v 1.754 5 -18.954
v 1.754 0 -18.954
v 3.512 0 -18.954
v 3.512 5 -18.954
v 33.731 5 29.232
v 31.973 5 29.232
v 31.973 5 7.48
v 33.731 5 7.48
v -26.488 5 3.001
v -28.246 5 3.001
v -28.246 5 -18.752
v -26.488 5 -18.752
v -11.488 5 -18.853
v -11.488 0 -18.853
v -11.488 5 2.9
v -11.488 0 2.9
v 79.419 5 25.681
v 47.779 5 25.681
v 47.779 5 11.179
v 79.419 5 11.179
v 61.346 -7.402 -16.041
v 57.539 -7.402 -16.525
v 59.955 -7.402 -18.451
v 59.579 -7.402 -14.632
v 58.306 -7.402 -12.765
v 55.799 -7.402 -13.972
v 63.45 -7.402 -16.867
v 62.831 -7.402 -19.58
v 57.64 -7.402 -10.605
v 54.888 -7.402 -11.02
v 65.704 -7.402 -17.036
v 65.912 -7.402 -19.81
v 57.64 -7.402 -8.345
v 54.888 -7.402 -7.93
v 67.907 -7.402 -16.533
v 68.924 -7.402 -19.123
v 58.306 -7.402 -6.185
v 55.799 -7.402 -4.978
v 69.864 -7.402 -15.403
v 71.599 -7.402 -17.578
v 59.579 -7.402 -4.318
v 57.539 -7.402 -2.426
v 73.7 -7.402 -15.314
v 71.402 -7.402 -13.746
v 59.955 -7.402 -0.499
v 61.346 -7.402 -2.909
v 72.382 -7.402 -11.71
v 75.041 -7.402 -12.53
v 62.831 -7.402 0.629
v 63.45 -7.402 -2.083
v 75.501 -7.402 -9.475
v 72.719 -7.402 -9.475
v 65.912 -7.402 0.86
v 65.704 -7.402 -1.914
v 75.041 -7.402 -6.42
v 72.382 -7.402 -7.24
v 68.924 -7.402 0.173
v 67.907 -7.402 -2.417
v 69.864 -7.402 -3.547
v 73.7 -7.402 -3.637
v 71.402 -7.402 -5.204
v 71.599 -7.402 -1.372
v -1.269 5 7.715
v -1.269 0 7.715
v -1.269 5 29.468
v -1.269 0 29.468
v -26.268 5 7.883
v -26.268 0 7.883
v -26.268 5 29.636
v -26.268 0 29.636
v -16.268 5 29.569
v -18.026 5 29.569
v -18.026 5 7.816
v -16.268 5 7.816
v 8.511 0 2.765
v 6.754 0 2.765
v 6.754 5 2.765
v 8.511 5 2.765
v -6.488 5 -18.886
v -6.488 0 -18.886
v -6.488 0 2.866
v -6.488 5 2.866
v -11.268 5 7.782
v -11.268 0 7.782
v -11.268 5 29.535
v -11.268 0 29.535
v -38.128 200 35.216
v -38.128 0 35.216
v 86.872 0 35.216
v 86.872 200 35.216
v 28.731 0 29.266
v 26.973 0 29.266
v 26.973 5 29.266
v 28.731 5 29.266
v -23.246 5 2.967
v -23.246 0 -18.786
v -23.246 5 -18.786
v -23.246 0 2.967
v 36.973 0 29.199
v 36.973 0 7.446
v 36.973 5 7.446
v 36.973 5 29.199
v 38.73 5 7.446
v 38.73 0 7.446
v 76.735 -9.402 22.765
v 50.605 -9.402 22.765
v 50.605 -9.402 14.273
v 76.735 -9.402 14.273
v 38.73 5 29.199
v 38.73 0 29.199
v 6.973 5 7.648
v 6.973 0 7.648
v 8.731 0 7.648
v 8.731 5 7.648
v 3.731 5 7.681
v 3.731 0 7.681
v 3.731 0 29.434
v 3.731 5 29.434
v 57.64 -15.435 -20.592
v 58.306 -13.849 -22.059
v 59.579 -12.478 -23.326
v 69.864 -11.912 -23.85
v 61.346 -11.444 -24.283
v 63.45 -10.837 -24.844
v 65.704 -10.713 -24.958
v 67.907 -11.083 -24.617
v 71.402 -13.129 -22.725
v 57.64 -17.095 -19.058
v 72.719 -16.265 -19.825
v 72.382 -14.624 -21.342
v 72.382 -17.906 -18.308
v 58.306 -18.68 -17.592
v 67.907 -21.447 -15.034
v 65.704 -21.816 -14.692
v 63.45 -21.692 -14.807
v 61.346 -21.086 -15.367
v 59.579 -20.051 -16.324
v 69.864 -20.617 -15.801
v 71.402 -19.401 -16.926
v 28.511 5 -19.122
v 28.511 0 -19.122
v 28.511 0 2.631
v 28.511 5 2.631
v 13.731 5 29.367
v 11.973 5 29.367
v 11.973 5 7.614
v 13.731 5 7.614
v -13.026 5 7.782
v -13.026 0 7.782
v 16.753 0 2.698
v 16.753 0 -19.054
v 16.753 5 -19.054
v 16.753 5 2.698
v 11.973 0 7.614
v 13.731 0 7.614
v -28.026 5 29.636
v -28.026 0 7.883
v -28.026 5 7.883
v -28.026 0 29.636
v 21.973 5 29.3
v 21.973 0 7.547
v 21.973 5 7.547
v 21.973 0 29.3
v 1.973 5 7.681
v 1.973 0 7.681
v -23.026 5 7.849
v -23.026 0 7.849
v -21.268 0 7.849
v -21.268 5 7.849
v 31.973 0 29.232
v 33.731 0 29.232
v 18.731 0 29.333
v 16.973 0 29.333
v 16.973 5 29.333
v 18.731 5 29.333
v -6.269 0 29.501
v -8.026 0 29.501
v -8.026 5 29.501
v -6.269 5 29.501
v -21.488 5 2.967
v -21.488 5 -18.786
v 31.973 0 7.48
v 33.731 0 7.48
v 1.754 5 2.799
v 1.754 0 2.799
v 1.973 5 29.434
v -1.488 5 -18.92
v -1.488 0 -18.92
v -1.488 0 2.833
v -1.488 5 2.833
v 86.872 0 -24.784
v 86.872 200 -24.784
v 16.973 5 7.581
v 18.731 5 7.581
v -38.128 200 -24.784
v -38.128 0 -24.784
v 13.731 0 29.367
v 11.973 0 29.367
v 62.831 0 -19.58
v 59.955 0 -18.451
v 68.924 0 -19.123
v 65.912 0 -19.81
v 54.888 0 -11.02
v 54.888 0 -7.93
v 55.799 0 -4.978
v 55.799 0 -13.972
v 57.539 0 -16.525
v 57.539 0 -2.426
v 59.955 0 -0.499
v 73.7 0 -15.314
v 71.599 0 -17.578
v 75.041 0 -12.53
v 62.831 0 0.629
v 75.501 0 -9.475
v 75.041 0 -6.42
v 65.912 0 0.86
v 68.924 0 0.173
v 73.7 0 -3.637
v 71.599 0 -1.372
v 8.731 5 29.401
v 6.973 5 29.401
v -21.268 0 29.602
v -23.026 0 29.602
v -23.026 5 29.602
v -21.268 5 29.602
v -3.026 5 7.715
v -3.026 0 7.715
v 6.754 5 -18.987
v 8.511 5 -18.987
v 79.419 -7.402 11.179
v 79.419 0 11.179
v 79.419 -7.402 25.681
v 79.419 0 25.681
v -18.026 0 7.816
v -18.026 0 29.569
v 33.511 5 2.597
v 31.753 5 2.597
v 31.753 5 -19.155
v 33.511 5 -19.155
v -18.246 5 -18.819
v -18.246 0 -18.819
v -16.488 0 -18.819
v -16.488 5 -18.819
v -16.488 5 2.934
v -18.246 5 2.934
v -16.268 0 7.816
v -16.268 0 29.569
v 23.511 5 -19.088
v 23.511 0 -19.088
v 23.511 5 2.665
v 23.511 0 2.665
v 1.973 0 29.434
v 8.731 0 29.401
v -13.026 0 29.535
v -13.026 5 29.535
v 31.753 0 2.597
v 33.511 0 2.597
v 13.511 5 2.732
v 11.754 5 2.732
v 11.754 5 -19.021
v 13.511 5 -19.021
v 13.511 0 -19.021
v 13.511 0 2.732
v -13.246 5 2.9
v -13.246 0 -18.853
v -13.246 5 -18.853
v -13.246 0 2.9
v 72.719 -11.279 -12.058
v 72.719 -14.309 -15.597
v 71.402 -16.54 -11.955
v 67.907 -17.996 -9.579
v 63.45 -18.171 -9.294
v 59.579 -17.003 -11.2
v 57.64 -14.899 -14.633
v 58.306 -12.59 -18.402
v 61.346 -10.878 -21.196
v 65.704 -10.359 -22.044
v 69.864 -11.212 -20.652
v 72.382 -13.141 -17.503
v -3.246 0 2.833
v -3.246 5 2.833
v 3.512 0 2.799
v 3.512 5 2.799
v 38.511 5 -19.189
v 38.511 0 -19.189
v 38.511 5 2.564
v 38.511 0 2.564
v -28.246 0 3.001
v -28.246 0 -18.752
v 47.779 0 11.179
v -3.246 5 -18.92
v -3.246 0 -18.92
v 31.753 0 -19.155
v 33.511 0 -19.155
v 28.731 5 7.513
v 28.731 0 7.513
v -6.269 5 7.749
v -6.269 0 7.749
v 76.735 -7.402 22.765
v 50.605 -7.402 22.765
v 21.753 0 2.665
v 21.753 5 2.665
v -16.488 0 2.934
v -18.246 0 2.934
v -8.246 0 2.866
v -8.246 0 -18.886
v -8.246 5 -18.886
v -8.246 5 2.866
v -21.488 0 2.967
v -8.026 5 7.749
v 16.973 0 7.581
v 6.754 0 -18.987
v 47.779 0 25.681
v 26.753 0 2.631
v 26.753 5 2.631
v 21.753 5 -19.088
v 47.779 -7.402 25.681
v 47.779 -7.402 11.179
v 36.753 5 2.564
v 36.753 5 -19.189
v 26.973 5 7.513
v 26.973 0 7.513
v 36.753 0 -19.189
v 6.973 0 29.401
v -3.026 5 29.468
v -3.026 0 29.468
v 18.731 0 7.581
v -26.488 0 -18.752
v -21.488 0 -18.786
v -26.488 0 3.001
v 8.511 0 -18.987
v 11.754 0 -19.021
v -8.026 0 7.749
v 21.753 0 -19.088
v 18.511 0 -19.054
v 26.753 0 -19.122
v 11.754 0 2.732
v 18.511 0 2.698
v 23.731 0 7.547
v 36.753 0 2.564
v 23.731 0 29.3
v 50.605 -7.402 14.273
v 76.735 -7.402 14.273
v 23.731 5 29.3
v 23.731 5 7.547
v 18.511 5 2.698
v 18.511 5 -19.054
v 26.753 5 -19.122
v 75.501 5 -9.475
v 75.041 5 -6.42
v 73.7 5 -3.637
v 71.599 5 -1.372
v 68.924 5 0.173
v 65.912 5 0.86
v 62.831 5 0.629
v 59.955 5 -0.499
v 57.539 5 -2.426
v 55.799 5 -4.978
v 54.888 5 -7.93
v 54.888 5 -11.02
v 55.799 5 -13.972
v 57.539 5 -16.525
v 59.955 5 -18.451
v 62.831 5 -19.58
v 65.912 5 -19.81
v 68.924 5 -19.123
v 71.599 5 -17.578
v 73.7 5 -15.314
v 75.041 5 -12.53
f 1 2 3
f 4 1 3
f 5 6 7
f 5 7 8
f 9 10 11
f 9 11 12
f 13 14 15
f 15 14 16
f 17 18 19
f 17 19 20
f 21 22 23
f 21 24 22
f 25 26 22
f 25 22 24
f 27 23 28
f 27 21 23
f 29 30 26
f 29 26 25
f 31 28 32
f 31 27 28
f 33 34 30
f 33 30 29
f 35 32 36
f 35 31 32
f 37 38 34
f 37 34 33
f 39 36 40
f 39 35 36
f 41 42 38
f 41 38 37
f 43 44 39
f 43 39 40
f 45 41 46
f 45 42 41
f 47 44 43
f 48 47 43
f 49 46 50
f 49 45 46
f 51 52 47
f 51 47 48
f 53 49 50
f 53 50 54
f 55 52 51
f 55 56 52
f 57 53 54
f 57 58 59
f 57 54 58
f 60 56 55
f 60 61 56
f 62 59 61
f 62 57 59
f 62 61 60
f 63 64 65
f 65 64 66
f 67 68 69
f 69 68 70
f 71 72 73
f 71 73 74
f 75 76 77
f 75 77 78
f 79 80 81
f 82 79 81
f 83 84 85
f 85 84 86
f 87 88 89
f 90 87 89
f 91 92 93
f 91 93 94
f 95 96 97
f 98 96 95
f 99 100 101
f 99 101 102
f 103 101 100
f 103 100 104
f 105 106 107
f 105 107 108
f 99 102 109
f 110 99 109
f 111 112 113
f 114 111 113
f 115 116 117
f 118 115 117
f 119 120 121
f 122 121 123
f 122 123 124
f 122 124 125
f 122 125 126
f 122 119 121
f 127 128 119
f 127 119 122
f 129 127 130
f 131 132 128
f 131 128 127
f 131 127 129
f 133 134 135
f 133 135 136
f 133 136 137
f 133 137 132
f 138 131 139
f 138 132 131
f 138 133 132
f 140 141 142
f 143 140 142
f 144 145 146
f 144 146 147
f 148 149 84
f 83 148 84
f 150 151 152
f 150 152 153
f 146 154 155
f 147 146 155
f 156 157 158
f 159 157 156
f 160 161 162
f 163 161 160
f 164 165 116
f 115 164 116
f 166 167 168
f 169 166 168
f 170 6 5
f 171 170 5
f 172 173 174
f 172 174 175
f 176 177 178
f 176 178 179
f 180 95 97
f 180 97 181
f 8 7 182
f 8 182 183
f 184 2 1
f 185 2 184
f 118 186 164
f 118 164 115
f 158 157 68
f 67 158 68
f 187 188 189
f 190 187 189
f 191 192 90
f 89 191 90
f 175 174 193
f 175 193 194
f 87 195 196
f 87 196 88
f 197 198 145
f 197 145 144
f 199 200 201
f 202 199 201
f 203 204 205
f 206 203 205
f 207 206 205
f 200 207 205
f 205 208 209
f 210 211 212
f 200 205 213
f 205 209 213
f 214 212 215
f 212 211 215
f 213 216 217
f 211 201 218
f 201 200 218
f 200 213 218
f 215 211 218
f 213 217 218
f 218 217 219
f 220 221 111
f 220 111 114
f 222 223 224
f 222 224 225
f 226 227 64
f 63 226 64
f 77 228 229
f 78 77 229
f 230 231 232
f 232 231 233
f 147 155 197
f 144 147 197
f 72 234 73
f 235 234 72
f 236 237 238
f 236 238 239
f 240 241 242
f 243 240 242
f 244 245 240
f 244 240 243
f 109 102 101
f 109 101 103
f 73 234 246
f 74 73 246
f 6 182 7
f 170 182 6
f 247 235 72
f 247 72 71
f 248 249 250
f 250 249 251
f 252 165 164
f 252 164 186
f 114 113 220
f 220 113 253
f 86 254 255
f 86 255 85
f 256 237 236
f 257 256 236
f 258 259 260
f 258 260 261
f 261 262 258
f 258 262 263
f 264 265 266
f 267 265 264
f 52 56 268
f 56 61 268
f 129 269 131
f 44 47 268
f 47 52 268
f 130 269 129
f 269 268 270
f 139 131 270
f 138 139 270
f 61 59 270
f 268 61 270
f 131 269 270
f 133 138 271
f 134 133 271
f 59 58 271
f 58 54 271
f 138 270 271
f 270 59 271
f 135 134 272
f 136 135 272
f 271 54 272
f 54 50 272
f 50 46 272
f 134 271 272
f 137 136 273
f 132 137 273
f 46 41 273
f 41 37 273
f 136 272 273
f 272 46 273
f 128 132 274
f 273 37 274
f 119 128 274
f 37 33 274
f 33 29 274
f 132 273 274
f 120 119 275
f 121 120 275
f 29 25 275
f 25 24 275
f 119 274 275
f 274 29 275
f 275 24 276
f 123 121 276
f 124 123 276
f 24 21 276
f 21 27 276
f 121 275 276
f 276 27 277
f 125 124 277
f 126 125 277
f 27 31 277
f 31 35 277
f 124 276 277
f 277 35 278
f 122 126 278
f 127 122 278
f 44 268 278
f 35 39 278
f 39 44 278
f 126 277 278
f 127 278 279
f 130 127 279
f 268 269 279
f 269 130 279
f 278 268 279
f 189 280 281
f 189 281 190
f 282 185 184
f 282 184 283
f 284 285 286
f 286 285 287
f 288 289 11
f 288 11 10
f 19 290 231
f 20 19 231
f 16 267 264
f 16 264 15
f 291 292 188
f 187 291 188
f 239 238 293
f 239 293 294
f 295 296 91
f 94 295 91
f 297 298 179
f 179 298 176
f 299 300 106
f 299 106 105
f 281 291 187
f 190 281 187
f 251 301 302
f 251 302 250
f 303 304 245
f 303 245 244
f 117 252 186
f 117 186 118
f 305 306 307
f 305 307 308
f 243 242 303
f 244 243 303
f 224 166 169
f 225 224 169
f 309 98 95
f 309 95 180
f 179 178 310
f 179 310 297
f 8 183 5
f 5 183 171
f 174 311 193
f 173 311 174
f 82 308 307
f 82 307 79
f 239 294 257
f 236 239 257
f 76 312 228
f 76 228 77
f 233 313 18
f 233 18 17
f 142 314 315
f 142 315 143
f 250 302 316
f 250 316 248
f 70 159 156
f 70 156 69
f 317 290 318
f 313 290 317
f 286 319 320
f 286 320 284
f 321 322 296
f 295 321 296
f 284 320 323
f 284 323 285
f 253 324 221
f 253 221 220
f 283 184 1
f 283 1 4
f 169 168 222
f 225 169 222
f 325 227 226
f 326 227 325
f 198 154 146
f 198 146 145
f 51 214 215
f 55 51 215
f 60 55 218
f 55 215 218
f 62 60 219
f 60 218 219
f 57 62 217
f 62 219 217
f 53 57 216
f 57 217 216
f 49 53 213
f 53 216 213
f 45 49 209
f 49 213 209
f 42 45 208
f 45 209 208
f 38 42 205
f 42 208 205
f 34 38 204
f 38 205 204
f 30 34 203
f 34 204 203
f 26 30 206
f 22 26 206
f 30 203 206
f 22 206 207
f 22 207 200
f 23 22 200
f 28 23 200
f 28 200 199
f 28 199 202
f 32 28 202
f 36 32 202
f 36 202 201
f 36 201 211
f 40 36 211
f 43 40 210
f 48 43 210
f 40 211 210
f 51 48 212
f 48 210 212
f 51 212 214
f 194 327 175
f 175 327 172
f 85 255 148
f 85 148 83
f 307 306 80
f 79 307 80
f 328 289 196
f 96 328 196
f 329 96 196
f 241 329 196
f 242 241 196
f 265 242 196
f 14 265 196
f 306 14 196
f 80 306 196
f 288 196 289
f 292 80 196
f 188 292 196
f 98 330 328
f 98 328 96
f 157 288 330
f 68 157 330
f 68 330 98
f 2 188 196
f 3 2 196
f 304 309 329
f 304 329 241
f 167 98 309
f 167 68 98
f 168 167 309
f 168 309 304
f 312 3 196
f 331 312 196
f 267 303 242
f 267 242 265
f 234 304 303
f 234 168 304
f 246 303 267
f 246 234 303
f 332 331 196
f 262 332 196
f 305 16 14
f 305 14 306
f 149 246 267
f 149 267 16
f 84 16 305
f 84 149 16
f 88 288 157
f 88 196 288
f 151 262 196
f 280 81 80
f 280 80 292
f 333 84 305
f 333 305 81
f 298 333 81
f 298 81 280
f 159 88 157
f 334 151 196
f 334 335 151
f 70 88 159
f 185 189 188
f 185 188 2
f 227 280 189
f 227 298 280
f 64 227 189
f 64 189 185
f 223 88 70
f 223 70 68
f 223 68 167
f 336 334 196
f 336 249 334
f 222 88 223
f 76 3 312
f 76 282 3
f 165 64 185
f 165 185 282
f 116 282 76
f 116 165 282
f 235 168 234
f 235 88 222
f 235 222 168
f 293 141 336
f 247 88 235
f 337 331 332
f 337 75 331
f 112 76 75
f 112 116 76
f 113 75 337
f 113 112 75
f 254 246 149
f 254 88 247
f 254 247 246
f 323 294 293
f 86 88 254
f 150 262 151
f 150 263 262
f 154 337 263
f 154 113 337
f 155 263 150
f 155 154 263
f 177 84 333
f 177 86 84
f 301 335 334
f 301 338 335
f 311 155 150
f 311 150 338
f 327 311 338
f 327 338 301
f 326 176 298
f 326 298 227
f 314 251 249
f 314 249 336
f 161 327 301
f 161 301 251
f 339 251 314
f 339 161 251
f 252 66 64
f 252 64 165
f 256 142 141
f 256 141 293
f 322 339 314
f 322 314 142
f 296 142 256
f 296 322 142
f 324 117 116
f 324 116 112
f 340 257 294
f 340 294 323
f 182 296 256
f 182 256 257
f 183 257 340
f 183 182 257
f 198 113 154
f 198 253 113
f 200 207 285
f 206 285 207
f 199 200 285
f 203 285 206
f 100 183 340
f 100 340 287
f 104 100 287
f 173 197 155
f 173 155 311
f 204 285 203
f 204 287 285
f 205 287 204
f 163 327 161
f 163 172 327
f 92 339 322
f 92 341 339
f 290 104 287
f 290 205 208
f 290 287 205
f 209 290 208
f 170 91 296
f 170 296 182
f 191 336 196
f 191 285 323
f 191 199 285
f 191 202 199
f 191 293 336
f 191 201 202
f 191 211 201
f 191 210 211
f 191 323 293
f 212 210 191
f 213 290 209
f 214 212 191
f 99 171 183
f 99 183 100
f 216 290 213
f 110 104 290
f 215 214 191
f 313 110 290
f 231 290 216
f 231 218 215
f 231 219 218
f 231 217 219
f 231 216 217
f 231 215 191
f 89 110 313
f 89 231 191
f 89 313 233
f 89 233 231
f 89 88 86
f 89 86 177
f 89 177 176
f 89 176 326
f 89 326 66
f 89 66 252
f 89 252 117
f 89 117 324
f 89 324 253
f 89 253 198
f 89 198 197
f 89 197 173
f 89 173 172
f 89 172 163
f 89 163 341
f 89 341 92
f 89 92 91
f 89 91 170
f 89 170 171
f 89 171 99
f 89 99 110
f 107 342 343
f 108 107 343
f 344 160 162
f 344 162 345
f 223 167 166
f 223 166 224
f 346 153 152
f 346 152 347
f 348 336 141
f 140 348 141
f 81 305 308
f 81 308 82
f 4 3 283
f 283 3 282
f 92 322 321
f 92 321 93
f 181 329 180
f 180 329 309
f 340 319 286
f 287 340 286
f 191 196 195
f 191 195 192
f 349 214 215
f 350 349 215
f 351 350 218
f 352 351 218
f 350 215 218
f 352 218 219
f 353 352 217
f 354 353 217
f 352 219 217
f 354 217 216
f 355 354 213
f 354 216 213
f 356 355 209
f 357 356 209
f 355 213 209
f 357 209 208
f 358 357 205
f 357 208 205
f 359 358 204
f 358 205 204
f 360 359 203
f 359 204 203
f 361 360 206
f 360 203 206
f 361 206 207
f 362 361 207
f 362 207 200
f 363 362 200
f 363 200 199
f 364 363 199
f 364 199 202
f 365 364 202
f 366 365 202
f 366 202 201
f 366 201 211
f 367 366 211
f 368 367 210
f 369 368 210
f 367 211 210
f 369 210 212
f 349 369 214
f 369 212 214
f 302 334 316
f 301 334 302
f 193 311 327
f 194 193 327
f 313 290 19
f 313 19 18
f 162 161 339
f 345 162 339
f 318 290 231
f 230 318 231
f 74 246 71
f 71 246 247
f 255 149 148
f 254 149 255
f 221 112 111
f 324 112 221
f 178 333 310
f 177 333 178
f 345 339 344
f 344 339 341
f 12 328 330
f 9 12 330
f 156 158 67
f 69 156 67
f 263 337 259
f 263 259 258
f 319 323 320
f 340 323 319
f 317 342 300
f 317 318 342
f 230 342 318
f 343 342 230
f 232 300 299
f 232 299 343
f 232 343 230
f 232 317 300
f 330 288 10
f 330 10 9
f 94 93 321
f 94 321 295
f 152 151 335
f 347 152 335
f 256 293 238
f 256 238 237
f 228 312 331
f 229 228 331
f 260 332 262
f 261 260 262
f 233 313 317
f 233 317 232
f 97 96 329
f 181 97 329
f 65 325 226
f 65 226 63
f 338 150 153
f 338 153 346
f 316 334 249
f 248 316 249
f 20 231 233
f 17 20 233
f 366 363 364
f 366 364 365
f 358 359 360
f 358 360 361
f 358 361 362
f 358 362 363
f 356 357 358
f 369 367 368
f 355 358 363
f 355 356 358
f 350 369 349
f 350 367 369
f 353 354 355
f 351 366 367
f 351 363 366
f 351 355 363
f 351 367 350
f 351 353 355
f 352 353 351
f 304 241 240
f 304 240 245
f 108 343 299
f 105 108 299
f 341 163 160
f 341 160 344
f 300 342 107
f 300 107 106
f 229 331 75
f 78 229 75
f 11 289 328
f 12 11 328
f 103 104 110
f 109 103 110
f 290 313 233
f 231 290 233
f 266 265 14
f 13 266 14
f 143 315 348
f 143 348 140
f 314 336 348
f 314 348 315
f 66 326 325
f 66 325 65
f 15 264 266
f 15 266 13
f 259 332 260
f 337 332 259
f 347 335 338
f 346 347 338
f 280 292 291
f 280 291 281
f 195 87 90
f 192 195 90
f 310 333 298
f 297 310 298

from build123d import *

# Parameters (mm, degrees)
F0_W     = 125
F0_H     = 60
F1_DEPTH = 200
F2_W     = 31.640227
F2_H     = 14.501772
F2_R     = 10.364351
F3_DEPTH = 7.40166
F2_W_2   = 1.757792
F2_H_2   = 21.752657
F2_W_3   = 1.757791
F2_H_3   = 21.752658
F4_DEPTH = 5
F5_W     = 26.129712
F5_H     = 8.492156
F6_DEPTH = 2
F7_R     = 7.582091
F8_ANGLE = 47.242453


with BuildPart() as f1:
    # F0 (on Front) → F1 (new body)
    with BuildSketch(Plane.XZ):
        with Locations((24.371509, 5.21648)):
            Rectangle(F0_W, F0_H)
    extrude(amount=-F1_DEPTH)

    # F2 (on face) → F3 (join)
    with BuildSketch(Plane.XZ):
        with Locations((63.598962, 18.429833)):
            Rectangle(F2_W, F2_H)
        with Locations((65.137036, -9.475091)):
            Circle(F2_R)
    extrude(amount=F3_DEPTH)

    # F2 (on face) → F4 (cut)
    with BuildSketch(Plane.XZ):
        with Locations((63.598962, 18.429833)):
            Rectangle(F2_W, F2_H)
        with Locations((65.137036, -9.475091)):
            Circle(F2_R)
        with Locations((-27.146968, 18.759419)):
            Rectangle(F2_W_2, F2_H_2)
        with Locations((-27.366695, -7.875601)):
            Rectangle(F2_W_3, F2_H_2)
        with Locations((-22.147081, 18.725813)):
            Rectangle(F2_W_2, F2_H_2)
        with Locations((-22.366808, -7.909207)):
            Rectangle(F2_W_3, F2_H_3)
        with Locations((-17.147194, 18.692208)):
            Rectangle(F2_W_2, F2_H_3)
        with Locations((-17.36692, -7.942812)):
            Rectangle(F2_W_3, F2_H_2)
        with Locations((-12.147306, 18.658603)):
            Rectangle(F2_W_3, F2_H_2)
        with Locations((-12.367033, -7.976418)):
            Rectangle(F2_W_3, F2_H_3)
        with Locations((-7.147419, 18.624997)):
            Rectangle(F2_W_3, F2_H_3)
        with Locations((-7.367146, -8.010023)):
            Rectangle(F2_W_2, F2_H_2)
        with Locations((-2.147532, 18.591392)):
            Rectangle(F2_W_3, F2_H_2)
        with Locations((-2.367259, -8.043629)):
            Rectangle(F2_W_2, F2_H_2)
        with Locations((2.852354, 18.557785)):
            Rectangle(F2_W_3, F2_H_2)
        with Locations((2.632628, -8.077235)):
            Rectangle(F2_W_2, F2_H_3)
        with Locations((7.852241, 18.52418)):
            Rectangle(F2_W_3, F2_H_3)
        with Locations((7.632515, -8.11084)):
            Rectangle(F2_W_2, F2_H_2)
        with Locations((12.852128, 18.490574)):
            Rectangle(F2_W_3, F2_H_2)
        with Locations((12.632402, -8.144446)):
            Rectangle(F2_W_3, F2_H_3)
        with Locations((17.852016, 18.456969)):
            Rectangle(F2_W_3, F2_H_3)
        with Locations((17.632289, -8.178051)):
            Rectangle(F2_W_3, F2_H_2)
        with Locations((22.851903, 18.423364)):
            Rectangle(F2_W_3, F2_H_2)
        with Locations((22.632176, -8.211657)):
            Rectangle(F2_W_3, F2_H_3)
        with Locations((27.851789, 18.389757)):
            Rectangle(F2_W_3, F2_H_2)
        with Locations((27.632064, -8.245262)):
            Rectangle(F2_W_3, F2_H_2)
        with Locations((32.851676, 18.356152)):
            Rectangle(F2_W_3, F2_H_3)
        with Locations((32.631951, -8.278868)):
            Rectangle(F2_W_3, F2_H_2)
        with Locations((37.851563, 18.322546)):
            Rectangle(F2_W_3, F2_H_2)
        with Locations((37.631837, -8.312474)):
            Rectangle(F2_W_3, F2_H_3)
    extrude(amount=-F4_DEPTH, mode=Mode.SUBTRACT)

    # F5 (on face) → F6 (join)
    with BuildSketch(Plane.XZ.offset(7.40166)):
        with Locations((63.670112, 18.518826)):
            Rectangle(F5_W, F5_H)
    extrude(amount=F6_DEPTH)

    # F7 (on face) → F8 (revolve)
    with BuildSketch(Plane.XZ.offset(7.40166)):
        with Locations((65.137036, -9.475091)):
            Circle(F7_R)
    revolve(axis=Axis((24.371509, 0, -24.78352), (1, 0, 0)), revolution_arc=F8_ANGLE)


solid = f1.part
